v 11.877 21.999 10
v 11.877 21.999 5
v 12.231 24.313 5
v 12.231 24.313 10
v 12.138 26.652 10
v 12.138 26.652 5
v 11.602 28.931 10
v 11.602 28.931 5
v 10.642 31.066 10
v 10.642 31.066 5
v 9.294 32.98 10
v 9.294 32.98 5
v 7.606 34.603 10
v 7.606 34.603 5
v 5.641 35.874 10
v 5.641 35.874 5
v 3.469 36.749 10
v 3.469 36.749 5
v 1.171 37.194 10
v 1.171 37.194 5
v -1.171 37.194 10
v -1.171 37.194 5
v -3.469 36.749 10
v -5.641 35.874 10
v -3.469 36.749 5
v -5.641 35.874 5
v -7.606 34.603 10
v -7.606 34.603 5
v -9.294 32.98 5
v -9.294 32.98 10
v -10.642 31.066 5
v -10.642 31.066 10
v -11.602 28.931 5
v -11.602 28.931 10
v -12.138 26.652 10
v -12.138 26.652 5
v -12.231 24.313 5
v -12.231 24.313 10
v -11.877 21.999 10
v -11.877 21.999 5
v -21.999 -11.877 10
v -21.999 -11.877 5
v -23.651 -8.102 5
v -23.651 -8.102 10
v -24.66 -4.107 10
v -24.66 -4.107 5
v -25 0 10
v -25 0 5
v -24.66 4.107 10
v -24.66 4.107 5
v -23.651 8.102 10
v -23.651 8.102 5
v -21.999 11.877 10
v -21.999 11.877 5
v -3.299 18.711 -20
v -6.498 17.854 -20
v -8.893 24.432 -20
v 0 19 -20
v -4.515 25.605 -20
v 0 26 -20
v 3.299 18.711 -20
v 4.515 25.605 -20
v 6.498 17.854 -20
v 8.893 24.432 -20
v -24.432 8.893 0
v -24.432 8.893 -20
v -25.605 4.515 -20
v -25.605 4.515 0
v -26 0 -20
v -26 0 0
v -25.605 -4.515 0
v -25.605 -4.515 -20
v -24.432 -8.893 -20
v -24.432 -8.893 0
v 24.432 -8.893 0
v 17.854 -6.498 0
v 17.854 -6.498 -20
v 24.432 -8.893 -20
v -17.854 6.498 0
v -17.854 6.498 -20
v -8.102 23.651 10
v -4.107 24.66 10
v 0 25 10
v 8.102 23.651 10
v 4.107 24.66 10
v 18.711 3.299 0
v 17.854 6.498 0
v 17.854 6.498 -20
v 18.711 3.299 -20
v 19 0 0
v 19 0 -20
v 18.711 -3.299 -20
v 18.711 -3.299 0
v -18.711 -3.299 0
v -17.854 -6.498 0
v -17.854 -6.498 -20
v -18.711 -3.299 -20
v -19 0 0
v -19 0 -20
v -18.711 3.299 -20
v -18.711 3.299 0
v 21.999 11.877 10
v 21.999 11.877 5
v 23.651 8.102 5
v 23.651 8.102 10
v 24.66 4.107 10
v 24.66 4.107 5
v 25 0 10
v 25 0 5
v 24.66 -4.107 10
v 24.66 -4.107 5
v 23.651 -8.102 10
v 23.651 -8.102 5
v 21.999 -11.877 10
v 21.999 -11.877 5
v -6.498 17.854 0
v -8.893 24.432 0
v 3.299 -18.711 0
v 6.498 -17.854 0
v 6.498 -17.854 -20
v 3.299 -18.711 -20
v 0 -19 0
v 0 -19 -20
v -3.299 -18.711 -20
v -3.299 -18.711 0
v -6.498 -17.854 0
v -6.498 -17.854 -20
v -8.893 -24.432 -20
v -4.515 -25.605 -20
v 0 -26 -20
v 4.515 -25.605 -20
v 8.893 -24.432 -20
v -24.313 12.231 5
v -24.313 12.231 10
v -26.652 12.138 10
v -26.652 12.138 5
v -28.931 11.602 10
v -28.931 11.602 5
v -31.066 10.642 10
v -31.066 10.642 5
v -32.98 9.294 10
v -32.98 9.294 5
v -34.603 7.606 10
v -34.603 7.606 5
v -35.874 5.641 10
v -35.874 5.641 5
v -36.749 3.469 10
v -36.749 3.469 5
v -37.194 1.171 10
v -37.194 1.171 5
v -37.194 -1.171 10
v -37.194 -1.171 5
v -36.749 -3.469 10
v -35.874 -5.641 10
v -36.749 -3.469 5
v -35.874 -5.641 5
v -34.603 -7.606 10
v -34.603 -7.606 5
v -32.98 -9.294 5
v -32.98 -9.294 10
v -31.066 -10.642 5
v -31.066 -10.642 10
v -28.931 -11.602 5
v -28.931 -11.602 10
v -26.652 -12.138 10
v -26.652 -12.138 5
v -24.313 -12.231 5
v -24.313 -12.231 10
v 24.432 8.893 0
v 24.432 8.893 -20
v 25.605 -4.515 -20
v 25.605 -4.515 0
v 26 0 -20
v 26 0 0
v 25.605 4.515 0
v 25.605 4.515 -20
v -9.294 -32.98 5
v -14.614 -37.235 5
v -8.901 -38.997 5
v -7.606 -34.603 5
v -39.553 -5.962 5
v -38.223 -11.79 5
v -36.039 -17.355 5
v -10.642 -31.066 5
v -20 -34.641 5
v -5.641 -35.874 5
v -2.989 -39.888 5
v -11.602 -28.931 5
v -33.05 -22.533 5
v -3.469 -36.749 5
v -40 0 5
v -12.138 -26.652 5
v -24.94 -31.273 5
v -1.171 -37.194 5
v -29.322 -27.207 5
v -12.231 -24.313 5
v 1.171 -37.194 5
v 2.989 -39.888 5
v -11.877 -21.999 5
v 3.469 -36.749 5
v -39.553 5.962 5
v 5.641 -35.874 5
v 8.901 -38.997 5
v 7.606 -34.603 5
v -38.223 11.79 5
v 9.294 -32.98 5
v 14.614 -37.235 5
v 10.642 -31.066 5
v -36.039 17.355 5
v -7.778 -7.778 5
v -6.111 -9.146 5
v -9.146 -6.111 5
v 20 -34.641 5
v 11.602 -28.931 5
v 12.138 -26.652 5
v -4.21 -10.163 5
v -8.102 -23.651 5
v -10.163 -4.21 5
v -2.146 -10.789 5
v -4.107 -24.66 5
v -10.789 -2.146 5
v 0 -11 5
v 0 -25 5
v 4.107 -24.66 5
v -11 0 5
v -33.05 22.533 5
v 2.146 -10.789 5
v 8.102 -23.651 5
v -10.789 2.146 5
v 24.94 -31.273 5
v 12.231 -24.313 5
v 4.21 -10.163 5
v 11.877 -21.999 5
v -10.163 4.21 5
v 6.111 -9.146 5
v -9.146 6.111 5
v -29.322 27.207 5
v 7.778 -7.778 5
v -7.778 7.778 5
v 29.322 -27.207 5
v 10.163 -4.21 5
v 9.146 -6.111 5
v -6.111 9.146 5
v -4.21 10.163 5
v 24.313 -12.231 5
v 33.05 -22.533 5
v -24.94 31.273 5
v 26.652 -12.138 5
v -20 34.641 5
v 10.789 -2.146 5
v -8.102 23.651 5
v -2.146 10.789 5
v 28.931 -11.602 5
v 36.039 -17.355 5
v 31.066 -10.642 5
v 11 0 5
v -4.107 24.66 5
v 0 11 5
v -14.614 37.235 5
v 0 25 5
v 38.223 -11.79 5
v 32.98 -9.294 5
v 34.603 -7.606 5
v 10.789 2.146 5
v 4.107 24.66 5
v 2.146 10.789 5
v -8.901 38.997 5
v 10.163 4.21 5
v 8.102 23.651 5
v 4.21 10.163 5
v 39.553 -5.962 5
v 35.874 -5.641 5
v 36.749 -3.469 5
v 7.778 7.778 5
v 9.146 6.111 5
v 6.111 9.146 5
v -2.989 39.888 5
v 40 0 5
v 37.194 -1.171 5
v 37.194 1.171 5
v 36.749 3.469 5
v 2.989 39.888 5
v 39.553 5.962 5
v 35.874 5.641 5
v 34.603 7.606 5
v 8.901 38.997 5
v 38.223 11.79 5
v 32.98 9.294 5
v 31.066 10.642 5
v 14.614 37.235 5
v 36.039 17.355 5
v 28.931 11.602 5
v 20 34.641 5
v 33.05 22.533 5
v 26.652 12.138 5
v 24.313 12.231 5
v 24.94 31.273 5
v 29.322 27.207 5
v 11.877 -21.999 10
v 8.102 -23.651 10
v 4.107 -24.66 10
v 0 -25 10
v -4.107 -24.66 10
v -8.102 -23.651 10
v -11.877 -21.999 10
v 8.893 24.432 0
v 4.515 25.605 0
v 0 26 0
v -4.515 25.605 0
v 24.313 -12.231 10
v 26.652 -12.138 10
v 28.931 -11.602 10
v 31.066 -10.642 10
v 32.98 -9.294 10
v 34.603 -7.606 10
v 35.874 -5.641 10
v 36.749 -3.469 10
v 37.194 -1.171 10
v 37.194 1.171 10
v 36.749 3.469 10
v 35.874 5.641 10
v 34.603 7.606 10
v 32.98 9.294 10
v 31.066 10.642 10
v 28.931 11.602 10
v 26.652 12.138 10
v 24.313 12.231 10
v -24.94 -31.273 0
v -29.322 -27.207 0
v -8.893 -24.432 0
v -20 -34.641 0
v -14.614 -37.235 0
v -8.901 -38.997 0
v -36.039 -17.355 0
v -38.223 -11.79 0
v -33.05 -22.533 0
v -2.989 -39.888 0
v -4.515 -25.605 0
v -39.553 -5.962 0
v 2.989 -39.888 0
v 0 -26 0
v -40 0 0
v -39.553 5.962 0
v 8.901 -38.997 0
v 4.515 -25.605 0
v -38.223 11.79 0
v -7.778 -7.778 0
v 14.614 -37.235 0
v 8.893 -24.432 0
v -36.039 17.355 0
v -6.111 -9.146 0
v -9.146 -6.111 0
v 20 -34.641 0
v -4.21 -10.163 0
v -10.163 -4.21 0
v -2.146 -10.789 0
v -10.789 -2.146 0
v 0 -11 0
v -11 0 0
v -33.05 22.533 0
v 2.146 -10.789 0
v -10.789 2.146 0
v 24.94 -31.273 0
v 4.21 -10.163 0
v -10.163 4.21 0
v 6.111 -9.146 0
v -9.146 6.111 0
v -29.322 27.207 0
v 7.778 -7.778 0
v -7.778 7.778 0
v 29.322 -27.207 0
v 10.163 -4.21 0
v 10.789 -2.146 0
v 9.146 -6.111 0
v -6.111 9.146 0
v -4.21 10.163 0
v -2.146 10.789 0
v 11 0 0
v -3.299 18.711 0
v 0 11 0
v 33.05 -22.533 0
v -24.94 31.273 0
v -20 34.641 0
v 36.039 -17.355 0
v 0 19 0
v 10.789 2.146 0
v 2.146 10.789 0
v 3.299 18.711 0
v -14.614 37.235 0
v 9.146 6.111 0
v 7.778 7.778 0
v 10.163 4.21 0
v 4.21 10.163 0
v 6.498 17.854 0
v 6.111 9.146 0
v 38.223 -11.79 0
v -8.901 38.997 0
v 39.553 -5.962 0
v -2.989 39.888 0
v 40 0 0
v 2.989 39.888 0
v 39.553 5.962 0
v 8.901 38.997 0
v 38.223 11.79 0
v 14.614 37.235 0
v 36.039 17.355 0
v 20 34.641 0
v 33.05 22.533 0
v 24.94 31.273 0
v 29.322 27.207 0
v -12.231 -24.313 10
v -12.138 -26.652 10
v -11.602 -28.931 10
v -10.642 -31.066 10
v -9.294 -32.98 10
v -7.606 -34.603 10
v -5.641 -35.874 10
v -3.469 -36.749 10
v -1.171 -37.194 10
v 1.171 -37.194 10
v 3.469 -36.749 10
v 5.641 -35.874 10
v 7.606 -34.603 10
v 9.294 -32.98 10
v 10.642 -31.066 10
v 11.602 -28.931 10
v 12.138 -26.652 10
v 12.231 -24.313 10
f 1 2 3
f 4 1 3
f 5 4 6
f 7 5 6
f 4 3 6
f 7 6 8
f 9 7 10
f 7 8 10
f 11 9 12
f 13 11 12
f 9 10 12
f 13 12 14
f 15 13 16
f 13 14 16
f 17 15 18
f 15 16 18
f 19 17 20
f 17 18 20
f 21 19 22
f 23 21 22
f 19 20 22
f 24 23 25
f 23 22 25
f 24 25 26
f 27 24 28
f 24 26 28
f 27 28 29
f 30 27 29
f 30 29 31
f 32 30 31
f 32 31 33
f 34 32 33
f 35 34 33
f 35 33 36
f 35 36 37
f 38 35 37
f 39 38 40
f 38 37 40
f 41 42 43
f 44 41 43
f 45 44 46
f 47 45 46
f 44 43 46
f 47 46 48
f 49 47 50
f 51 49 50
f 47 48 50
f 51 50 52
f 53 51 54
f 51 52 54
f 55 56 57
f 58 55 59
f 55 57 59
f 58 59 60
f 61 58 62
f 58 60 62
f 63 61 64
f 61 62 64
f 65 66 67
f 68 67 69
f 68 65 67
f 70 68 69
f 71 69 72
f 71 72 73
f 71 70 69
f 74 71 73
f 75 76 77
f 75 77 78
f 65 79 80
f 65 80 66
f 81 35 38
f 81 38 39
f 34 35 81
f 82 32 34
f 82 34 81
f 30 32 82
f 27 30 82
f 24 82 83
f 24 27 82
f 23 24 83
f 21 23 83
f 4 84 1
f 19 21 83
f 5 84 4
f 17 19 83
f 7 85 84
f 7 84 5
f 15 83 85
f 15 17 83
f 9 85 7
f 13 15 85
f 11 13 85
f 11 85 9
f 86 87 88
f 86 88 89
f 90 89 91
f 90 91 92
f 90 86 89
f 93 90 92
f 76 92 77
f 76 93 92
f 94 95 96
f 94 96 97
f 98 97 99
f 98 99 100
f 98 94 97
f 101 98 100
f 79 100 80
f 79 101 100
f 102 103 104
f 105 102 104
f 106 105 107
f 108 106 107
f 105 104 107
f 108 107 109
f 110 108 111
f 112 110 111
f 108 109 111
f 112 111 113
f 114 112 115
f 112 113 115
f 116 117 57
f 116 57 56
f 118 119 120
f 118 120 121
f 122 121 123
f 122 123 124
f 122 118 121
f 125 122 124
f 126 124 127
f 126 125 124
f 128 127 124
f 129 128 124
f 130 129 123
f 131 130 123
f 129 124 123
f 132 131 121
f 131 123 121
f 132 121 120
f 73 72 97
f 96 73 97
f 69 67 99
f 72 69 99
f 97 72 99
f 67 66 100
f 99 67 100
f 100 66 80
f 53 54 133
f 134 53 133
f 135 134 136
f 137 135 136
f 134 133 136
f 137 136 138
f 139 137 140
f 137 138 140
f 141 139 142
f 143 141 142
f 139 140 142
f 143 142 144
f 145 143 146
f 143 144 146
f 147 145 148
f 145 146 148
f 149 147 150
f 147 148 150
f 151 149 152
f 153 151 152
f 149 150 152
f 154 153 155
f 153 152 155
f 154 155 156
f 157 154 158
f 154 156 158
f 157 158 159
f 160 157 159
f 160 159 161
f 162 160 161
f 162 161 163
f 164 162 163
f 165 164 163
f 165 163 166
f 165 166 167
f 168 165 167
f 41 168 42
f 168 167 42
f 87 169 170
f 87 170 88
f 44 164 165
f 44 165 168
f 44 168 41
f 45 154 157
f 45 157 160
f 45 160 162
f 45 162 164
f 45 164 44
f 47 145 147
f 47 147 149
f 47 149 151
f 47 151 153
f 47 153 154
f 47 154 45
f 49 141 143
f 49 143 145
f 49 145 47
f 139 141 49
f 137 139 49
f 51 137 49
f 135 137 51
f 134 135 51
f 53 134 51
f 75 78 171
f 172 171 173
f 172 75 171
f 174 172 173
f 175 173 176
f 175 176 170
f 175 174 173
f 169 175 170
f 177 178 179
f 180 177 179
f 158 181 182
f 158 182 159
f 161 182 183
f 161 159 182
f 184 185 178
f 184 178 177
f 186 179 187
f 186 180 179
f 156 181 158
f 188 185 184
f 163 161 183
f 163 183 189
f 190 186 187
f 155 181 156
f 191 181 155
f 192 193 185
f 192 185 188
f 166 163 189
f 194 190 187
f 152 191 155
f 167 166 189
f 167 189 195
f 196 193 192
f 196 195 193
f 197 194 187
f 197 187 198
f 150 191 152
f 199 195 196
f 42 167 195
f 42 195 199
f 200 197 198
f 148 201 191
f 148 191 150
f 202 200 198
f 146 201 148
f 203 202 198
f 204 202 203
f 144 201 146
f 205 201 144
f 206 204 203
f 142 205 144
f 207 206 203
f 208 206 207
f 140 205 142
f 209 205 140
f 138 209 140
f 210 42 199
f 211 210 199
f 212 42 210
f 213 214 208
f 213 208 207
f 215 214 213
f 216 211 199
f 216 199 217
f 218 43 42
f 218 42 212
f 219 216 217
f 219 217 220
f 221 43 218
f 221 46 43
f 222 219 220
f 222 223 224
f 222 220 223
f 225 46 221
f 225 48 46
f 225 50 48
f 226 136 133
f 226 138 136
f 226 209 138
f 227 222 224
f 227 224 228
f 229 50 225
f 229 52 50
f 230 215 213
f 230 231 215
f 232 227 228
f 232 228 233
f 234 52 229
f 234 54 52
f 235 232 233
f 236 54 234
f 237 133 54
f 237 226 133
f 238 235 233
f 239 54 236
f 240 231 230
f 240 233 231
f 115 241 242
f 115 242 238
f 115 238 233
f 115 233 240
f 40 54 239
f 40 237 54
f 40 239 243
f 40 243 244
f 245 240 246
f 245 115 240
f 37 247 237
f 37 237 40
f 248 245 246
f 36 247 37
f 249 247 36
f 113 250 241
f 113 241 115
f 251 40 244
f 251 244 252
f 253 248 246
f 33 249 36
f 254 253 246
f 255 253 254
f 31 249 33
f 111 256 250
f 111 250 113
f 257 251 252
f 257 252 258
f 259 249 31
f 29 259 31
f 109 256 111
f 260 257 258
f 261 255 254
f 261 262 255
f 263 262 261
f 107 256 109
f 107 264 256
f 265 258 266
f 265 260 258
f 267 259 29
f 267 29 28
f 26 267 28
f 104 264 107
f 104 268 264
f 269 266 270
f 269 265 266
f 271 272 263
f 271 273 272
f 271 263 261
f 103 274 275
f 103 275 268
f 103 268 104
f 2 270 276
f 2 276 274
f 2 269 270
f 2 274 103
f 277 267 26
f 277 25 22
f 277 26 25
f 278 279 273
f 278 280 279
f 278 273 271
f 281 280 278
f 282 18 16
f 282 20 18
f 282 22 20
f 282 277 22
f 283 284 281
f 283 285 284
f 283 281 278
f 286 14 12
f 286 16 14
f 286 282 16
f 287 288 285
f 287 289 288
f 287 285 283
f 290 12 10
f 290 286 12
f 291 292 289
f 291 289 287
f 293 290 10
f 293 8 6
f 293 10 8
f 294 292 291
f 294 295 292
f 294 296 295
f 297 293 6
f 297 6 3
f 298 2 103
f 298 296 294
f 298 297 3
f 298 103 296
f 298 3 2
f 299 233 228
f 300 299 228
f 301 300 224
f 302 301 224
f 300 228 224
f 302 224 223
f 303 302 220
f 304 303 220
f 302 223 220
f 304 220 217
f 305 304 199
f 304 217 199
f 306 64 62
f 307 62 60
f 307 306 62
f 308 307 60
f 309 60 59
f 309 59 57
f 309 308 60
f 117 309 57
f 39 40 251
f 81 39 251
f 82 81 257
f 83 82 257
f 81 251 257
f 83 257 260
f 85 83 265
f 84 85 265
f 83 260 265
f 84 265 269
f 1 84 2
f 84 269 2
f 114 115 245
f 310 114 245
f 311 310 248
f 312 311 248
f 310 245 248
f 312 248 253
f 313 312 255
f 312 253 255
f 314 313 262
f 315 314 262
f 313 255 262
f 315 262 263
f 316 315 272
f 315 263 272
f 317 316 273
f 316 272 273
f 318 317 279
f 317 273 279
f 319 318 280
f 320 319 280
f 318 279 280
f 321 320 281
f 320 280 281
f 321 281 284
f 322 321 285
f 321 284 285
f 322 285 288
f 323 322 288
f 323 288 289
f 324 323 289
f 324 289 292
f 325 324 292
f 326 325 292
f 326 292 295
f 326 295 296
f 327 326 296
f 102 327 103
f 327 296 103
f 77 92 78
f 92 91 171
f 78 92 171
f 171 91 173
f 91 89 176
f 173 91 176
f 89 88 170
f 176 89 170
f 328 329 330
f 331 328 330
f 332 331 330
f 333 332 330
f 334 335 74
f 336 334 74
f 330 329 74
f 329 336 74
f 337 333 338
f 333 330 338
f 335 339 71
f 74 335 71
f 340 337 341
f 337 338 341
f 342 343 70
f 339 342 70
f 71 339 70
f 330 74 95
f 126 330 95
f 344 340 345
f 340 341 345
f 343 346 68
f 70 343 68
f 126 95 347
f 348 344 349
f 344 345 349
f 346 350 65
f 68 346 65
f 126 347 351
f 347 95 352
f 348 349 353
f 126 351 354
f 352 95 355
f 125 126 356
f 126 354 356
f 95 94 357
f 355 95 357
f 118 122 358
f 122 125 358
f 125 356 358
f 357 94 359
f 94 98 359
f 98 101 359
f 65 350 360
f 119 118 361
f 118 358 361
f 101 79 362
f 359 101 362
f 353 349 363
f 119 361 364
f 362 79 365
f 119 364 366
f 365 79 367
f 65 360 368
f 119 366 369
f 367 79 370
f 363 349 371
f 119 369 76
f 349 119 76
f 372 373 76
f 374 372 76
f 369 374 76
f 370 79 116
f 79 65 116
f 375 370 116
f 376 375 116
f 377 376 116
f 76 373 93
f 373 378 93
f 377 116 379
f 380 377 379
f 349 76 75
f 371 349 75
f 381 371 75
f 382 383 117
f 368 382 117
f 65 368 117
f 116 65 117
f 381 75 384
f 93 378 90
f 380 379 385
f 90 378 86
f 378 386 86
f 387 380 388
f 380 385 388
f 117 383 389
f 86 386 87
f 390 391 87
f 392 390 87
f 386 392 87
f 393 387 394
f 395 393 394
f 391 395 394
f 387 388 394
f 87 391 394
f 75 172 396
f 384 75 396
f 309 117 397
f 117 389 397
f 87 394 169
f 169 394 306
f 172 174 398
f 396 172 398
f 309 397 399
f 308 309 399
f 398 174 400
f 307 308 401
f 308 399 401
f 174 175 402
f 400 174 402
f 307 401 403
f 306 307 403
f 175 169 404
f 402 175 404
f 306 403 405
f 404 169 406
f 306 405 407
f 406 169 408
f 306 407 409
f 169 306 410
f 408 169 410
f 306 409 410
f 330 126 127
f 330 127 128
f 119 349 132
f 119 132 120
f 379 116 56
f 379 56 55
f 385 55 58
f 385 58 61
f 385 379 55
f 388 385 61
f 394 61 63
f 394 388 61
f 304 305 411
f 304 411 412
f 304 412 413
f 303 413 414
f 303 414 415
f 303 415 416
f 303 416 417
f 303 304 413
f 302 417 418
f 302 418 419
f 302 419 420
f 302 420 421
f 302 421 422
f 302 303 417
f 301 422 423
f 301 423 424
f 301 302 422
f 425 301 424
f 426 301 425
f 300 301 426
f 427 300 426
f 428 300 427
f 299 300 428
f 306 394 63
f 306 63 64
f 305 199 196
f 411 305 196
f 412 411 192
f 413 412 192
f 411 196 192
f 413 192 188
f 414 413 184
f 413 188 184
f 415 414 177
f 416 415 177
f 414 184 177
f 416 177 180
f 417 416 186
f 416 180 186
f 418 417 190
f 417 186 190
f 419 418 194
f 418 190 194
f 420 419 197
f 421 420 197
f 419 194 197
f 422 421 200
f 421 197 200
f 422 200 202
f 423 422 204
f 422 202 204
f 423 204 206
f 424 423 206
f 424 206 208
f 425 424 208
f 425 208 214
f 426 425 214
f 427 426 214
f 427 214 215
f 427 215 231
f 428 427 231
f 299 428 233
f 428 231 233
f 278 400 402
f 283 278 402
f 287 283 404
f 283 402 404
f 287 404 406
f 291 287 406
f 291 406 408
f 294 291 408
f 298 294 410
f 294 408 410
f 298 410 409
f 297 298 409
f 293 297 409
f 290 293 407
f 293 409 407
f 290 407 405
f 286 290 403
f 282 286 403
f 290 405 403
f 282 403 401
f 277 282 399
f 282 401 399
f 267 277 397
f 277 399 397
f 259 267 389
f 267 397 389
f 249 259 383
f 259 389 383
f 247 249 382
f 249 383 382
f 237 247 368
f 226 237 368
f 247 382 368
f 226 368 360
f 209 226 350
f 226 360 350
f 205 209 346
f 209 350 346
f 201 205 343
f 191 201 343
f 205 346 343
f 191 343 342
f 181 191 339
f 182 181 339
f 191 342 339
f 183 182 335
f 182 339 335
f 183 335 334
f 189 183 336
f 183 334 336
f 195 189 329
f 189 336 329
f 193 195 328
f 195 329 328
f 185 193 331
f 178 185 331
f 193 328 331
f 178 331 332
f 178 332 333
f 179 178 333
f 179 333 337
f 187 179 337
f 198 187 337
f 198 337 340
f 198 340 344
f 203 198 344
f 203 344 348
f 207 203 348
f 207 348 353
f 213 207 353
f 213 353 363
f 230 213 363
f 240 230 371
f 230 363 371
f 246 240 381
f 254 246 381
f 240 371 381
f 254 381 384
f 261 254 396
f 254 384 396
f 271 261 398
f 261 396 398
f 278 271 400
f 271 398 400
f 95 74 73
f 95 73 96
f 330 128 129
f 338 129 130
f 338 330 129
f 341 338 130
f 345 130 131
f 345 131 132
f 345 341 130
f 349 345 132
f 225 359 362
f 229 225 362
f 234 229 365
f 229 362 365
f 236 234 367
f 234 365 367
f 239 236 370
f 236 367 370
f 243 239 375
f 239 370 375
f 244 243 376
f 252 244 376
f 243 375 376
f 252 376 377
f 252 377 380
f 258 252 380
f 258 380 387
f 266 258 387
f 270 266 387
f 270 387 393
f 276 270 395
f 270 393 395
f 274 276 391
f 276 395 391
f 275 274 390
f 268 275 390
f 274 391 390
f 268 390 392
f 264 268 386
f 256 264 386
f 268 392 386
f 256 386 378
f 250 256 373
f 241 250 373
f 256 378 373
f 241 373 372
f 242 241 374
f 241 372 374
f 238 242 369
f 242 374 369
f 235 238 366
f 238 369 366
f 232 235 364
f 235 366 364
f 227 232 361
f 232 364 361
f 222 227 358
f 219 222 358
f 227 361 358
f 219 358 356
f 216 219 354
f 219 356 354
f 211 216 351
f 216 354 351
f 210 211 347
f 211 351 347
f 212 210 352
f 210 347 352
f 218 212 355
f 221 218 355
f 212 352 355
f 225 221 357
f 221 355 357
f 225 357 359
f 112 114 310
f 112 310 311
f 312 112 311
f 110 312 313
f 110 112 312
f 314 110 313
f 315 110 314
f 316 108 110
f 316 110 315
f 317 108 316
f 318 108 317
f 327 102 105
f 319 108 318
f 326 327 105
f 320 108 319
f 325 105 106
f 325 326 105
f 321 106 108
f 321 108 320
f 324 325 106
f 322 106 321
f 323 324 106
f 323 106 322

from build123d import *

# Parameters (mm, degrees)
SKETCH_1_R          = 40
EXTRUDE_1_DEPTH     = 5
EXTRUDE_2_DEPTH     = 20
SKETCH_3_R          = 11
CUT_EXTRUDE_1_DEPTH = 5
EXTRUDE_5_DEPTH     = 5


with BuildPart() as part:
    # 草图1 → 凸台-拉伸1 (new body)
    with BuildSketch(Plane.XY):
        Circle(SKETCH_1_R)
    extrude(amount=EXTRUDE_1_DEPTH)

    # 草图2 → 凸台-拉伸2 (add)
    with BuildSketch(Plane(origin=(0, 0, 0), x_dir=(-1, 0, 0), z_dir=(0, 0, -1))):
        with BuildLine():
            Line((-6.498382723, 17.854159795), (-8.892523726, 24.43200814))
            ThreePointArc((-8.892523726, 24.43200814), (0, 26), (8.892523726, 24.43200814))
            Line((8.892523726, 24.43200814), (6.498382723, 17.854159795))
            ThreePointArc((6.498382723, 17.854159795), (0, 19), (-6.498382723, 17.854159795))
        make_face()
        with BuildLine():
            Line((17.854159795, 6.498382723), (24.43200814, 8.892523726))
            ThreePointArc((24.43200814, 8.892523726), (26, 0), (24.43200814, -8.892523726))
            Line((24.43200814, -8.892523726), (17.854159795, -6.498382723))
            ThreePointArc((17.854159795, -6.498382723), (19, 0), (17.854159795, 6.498382723))
        make_face()
        with BuildLine():
            Line((6.498382723, -17.854159795), (8.892523726, -24.43200814))
            ThreePointArc((8.892523726, -24.43200814), (0, -26), (-8.892523726, -24.43200814))
            Line((-8.892523726, -24.43200814), (-6.498382723, -17.854159795))
            ThreePointArc((-6.498382723, -17.854159795), (0, -19), (6.498382723, -17.854159795))
        make_face()
        with BuildLine():
            Line((-17.854159795, -6.498382723), (-24.43200814, -8.892523726))
            ThreePointArc((-24.43200814, -8.892523726), (-26, 0), (-24.43200814, 8.892523726))
            Line((-24.43200814, 8.892523726), (-17.854159795, 6.498382723))
            ThreePointArc((-17.854159795, 6.498382723), (-19, 0), (-17.854159795, -6.498382723))
        make_face()
    extrude(amount=EXTRUDE_2_DEPTH)

    # 草图3 → 切除-拉伸1 (cut)
    with BuildSketch(Plane(origin=(0, 0, 0), x_dir=(-1, 0, 0), z_dir=(0, 0, -1))):
        Circle(SKETCH_3_R)
    extrude(amount=-CUT_EXTRUDE_1_DEPTH, mode=Mode.SUBTRACT)

    # 草图5 → 凸台-拉伸5 (add)
    with BuildSketch(Plane.XY.offset(5)):
        with BuildLine():
            ThreePointArc((11.876657713, 21.99875), (0, 37.25), (-11.876657713, 21.99875))
            ThreePointArc((-11.876657713, 21.99875), (0, 25), (11.876657713, 21.99875))
        make_face()
        with BuildLine():
            ThreePointArc((21.99875, -11.876657713), (37.25, 0), (21.99875, 11.876657713))
            ThreePointArc((21.99875, 11.876657713), (25, 0), (21.99875, -11.876657713))
        make_face()
        with BuildLine():
            ThreePointArc((-11.876657713, -21.99875), (0, -37.25), (11.876657713, -21.99875))
            ThreePointArc((11.876657713, -21.99875), (0, -25), (-11.876657713, -21.99875))
        make_face()
        with BuildLine():
            ThreePointArc((-21.99875, 11.876657713), (-37.25, 0), (-21.99875, -11.876657713))
            ThreePointArc((-21.99875, -11.876657713), (-25, 0), (-21.99875, 11.876657713))
        make_face()
    extrude(amount=EXTRUDE_5_DEPTH)


solid = part.part
